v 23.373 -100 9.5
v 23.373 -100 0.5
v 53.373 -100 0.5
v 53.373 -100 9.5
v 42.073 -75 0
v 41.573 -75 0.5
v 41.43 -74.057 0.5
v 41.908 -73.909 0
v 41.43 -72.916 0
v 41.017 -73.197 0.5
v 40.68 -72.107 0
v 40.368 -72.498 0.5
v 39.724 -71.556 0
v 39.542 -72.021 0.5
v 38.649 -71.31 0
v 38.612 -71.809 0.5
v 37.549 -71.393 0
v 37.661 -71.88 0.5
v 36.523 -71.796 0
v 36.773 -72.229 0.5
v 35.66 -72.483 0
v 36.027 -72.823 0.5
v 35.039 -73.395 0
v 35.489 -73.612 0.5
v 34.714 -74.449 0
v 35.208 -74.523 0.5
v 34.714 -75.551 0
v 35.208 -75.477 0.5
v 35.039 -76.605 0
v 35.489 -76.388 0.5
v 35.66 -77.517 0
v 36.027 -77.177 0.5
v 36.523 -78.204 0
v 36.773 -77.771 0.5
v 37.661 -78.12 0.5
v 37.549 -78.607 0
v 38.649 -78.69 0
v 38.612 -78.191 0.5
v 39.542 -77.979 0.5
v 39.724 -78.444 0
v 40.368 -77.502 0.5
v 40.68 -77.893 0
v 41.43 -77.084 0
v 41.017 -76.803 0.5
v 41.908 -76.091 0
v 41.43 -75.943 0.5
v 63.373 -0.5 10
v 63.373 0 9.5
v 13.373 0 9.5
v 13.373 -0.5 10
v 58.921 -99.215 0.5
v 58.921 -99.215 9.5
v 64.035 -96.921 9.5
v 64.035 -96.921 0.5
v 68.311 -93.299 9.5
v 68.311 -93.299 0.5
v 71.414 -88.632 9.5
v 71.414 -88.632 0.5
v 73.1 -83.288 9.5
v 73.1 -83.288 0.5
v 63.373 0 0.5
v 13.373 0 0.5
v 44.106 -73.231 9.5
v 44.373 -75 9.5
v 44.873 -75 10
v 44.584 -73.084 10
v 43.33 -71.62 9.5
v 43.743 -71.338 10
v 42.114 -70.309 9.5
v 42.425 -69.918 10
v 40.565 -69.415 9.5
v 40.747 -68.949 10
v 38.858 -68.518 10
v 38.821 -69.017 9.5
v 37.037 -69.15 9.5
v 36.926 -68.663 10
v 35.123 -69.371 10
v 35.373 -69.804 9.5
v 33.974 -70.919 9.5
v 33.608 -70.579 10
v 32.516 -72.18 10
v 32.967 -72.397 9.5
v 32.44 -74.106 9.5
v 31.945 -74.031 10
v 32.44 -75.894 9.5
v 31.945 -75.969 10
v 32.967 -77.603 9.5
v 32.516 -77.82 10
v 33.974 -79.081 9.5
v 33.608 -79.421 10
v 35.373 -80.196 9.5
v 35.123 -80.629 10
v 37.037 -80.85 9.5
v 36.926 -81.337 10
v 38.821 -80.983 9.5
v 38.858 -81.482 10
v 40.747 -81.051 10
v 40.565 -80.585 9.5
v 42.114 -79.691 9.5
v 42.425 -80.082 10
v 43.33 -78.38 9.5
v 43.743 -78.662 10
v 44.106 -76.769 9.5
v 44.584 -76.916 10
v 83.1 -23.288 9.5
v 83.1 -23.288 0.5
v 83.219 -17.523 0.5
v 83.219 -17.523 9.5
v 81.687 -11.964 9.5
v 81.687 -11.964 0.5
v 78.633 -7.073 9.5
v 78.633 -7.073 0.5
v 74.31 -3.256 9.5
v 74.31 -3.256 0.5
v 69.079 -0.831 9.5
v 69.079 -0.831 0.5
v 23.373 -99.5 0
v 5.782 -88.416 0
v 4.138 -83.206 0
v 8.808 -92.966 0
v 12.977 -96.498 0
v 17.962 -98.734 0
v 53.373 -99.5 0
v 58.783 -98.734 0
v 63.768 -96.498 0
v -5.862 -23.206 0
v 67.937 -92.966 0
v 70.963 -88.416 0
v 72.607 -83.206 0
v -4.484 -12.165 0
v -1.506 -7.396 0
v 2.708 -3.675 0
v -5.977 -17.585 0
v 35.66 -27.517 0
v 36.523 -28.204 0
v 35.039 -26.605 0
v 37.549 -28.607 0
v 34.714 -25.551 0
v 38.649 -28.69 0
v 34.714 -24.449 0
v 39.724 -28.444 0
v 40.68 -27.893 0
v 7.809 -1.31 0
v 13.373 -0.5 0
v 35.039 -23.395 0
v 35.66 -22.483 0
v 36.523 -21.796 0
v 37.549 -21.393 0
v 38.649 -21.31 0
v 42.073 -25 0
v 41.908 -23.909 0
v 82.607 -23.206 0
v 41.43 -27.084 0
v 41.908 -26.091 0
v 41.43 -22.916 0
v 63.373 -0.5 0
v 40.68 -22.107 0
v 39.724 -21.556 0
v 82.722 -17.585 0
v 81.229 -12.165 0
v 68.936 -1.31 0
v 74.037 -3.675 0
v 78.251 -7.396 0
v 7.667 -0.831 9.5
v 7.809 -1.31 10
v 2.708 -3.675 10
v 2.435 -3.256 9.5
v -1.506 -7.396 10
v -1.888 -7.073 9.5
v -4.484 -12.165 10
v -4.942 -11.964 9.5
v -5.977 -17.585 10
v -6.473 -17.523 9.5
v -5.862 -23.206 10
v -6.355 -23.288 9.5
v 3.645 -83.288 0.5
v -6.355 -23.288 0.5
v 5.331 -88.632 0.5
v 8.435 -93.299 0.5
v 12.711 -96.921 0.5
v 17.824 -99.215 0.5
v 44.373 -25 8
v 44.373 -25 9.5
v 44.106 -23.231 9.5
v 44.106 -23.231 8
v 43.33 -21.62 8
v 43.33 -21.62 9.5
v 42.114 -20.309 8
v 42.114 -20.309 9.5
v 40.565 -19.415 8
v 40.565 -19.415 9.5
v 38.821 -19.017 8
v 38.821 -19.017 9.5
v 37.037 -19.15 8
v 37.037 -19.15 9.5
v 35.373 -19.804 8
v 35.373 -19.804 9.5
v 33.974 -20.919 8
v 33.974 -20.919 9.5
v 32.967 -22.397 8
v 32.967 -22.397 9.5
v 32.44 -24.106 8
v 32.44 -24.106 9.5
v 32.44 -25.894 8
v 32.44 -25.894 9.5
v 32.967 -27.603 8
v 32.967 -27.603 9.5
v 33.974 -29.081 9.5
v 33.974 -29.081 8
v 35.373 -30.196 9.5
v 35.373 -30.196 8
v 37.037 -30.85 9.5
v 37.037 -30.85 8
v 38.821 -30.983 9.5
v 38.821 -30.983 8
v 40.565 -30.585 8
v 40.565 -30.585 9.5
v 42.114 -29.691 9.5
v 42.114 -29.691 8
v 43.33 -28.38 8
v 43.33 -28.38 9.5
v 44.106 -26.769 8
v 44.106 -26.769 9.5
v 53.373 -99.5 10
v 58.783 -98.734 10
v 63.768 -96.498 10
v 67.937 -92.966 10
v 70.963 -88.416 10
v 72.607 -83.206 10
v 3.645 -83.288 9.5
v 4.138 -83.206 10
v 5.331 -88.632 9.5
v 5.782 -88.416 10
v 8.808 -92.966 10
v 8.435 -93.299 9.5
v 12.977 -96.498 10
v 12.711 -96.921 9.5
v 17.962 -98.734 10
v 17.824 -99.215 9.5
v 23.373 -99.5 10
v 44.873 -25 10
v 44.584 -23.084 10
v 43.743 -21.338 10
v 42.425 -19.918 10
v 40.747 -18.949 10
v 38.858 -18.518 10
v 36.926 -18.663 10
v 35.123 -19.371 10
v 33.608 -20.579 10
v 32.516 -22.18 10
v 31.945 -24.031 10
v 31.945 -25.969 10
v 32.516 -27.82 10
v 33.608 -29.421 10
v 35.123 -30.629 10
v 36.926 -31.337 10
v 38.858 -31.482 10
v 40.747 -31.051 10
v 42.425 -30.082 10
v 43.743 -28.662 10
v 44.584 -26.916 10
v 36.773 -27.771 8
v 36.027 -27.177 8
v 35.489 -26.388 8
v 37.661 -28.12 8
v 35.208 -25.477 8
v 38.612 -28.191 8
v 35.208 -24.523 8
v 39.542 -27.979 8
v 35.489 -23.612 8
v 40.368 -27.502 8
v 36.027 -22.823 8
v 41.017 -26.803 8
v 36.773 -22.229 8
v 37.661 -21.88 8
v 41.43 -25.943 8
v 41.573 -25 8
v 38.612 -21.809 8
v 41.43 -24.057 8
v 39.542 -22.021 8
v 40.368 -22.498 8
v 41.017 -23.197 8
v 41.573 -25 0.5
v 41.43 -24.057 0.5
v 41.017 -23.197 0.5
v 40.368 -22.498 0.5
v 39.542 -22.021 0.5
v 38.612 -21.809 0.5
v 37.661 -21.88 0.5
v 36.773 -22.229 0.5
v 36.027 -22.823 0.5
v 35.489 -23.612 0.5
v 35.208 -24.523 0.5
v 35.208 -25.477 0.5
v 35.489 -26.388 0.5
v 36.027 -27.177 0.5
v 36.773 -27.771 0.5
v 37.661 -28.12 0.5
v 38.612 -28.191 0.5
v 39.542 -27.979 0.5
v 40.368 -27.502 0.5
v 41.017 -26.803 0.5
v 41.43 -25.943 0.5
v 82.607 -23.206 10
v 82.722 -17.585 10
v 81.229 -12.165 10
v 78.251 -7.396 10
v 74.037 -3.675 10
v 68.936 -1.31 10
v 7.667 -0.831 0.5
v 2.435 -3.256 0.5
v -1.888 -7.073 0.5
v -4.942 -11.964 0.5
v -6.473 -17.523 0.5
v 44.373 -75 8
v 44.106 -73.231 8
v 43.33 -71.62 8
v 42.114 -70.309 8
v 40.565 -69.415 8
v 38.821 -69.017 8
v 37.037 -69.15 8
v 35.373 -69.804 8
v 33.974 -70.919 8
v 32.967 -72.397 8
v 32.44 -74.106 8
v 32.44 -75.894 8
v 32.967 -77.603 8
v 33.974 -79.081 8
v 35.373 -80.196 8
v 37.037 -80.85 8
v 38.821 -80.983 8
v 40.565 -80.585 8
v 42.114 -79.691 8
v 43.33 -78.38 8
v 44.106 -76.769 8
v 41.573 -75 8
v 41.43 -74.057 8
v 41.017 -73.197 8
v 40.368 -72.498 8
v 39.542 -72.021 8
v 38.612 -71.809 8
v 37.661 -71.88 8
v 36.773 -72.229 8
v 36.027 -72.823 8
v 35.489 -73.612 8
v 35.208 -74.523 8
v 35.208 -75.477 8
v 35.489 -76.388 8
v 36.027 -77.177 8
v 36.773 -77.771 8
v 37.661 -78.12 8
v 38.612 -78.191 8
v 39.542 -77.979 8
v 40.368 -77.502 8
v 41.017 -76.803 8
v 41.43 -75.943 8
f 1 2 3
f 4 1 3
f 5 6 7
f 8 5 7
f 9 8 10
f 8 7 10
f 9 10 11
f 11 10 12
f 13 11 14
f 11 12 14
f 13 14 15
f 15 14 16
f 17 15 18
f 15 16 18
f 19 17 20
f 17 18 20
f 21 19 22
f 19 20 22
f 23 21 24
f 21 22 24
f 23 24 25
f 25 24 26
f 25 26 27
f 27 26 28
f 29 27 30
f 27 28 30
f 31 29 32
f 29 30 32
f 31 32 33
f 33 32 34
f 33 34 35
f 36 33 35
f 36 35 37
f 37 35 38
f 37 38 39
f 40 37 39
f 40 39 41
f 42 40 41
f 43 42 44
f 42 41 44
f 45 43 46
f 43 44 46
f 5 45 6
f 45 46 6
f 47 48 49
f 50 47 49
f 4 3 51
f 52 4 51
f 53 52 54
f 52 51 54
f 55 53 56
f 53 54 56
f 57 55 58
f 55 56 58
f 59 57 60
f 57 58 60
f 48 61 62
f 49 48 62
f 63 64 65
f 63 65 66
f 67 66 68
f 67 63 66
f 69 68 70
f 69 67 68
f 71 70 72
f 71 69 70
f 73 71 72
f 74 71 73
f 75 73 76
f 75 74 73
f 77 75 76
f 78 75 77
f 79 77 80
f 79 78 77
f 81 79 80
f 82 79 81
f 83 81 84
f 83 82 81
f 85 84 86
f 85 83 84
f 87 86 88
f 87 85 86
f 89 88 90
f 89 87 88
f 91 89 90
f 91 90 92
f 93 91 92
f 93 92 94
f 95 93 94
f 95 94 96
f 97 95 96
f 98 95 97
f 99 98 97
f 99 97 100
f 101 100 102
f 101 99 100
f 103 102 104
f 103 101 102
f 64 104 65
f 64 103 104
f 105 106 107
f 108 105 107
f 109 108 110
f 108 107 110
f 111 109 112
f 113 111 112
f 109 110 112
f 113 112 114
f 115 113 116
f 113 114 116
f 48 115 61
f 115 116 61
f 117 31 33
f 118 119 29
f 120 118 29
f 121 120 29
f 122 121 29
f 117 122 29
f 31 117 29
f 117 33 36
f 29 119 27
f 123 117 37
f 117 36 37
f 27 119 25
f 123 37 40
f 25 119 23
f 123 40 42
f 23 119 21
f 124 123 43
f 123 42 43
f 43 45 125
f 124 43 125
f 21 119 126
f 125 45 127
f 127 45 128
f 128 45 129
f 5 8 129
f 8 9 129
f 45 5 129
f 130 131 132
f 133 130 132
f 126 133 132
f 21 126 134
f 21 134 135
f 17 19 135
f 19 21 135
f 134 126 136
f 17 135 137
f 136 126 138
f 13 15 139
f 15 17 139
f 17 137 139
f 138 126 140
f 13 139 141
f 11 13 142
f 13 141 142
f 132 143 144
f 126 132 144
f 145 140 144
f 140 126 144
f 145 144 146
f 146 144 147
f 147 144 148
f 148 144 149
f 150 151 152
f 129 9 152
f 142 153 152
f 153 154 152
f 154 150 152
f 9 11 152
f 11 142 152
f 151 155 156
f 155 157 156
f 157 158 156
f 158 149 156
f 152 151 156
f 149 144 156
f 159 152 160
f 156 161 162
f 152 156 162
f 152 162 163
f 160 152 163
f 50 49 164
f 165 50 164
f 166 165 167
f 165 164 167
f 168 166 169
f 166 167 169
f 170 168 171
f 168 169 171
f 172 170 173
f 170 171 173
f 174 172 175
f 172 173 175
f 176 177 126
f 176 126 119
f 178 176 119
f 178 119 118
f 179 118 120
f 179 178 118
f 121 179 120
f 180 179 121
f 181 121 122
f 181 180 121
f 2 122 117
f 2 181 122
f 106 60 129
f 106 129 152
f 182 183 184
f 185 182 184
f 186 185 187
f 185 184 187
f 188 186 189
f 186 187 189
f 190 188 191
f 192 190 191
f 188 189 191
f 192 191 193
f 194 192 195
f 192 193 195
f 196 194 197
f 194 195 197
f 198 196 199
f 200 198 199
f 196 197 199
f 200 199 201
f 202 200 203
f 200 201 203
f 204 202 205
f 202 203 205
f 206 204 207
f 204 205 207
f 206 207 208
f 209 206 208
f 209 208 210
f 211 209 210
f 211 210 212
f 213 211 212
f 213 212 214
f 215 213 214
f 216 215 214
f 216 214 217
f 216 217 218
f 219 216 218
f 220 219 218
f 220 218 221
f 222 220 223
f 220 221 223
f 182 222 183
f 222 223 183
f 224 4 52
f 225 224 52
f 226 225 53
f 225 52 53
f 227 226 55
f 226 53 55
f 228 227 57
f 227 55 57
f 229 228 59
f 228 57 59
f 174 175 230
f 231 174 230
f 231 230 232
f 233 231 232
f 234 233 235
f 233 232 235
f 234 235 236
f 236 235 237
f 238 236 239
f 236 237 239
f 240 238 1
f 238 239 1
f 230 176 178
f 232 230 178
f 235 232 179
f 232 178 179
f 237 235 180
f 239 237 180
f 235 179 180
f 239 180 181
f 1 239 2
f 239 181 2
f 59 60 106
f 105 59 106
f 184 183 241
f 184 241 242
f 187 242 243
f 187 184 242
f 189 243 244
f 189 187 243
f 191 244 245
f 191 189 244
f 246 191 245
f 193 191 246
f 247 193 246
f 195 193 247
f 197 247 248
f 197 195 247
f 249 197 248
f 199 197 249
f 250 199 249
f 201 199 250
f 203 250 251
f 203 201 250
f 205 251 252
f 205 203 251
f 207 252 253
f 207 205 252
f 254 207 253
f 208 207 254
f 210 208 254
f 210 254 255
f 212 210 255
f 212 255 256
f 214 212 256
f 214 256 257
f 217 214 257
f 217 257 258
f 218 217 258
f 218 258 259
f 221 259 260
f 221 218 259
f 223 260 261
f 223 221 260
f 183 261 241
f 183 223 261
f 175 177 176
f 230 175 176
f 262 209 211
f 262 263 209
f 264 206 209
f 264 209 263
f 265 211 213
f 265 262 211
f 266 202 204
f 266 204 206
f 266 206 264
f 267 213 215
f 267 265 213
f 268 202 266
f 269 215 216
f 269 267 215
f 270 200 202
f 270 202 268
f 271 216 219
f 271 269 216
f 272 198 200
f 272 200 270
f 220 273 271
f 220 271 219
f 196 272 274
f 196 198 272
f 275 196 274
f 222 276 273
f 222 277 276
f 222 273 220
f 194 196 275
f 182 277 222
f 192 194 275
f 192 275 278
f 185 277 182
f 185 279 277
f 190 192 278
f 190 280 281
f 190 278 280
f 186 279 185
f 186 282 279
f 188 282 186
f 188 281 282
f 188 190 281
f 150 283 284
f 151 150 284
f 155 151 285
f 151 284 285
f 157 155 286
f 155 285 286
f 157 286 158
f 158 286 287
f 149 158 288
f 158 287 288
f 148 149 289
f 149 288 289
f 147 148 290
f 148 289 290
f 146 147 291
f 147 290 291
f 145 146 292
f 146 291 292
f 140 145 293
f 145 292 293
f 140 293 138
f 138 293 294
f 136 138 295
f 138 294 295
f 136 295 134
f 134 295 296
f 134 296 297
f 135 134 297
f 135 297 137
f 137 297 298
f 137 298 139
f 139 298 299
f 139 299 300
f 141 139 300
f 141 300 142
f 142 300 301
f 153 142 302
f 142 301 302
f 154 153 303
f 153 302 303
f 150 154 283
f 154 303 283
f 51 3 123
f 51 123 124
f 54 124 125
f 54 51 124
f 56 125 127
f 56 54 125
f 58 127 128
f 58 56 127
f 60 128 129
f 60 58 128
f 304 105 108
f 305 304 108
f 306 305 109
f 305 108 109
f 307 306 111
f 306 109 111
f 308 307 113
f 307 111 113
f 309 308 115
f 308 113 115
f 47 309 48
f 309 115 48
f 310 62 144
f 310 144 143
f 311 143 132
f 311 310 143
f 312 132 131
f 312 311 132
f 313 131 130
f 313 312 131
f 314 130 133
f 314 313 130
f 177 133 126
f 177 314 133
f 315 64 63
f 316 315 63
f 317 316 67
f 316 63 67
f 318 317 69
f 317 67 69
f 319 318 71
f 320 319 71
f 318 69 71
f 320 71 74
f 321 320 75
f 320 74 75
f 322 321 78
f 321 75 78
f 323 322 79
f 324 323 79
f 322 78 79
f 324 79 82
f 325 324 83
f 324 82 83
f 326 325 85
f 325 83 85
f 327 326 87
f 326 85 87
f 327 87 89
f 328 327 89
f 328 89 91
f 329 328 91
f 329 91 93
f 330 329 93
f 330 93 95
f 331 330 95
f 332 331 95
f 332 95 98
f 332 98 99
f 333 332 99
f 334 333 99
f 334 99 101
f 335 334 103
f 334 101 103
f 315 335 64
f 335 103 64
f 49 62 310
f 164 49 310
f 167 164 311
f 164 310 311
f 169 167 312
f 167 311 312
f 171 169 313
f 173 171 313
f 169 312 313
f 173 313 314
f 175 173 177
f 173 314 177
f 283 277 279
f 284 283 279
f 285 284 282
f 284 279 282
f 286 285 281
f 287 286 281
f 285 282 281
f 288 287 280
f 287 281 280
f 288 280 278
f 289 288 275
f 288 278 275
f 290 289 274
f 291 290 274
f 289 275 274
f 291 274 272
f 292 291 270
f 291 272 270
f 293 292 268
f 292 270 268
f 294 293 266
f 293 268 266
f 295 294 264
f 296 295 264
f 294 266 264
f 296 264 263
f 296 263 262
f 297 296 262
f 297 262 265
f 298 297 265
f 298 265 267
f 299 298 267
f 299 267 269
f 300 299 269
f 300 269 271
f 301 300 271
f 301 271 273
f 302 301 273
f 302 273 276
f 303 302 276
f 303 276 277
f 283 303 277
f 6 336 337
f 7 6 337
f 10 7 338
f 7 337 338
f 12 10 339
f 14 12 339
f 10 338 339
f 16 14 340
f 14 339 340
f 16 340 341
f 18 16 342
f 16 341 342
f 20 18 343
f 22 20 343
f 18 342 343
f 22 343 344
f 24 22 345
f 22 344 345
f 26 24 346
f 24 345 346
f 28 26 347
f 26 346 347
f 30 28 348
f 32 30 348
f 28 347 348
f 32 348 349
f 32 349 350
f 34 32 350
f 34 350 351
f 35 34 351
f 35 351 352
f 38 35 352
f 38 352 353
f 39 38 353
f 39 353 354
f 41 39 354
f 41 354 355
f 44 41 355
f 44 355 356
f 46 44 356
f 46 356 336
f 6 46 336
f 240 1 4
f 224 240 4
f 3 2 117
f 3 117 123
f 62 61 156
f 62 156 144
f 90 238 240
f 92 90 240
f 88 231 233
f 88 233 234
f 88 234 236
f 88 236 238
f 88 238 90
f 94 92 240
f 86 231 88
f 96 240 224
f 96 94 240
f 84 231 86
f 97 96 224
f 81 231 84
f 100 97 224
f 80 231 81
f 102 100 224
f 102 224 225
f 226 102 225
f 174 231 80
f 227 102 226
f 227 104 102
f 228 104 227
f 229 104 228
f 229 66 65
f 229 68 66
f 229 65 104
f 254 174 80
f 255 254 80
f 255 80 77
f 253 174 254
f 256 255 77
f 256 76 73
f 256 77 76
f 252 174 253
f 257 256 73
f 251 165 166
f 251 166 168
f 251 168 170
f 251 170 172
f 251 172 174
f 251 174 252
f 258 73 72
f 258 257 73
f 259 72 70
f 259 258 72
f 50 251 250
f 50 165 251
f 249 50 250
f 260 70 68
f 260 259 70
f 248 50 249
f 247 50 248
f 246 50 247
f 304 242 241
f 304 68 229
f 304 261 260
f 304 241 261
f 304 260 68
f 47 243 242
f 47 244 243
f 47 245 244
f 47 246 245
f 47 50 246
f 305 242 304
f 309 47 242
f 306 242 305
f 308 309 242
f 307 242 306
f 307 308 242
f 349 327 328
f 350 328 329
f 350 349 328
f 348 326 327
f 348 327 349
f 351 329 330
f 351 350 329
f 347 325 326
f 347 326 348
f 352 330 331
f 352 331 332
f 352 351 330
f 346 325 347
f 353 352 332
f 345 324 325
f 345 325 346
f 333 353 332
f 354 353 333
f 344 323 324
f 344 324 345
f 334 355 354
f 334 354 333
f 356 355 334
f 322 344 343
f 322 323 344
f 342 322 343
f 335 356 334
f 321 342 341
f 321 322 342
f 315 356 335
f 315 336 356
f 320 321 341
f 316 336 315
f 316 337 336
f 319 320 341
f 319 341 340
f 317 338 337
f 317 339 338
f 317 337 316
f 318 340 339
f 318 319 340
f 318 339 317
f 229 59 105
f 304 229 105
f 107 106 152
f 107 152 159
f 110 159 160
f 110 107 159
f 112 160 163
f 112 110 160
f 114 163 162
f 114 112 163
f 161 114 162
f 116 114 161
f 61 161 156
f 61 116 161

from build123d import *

# Parameters (mm, degrees)
BOSS_EXTRUDE1_DEPTH = 10
SKETCH4_R           = 6
CUT_EXTRUDE1_DEPTH  = 2
SKETCH5_R           = 3.2
CUT_EXTRUDE2_DEPTH  = 131.441517879
CHAMFER1_SIZE       = 0.5


with BuildPart() as part:
    # Sketch3 → Boss-Extrude1 (new body)
    with BuildSketch(Plane.XY):
        with BuildLine():
            Line((-6.355283539, -23.287979746), (3.644716461, -83.287979746))
            ThreePointArc((3.644716461, -83.287979746), (10.445097015, -95.260399649), (23.372594937, -100))
            Line((23.372594937, -100), (53.372594937, -100))
            ThreePointArc((53.372594937, -100), (66.30009286, -95.260399649), (73.100473414, -83.287979746))
            Line((73.100473414, -83.287979746), (83.100473414, -23.287979746))
            ThreePointArc((83.100473414, -23.287979746), (78.632994587, -7.072502077), (63.372594937, 0))
            Line((63.372594937, 0), (13.372594937, 0))
            ThreePointArc((13.372594937, 0), (-1.887804712, -7.072502077), (-6.355283539, -23.287979746))
        make_face()
    extrude(amount=BOSS_EXTRUDE1_DEPTH)

    # Sketch4 → Cut-Extrude1 (cut)
    with BuildSketch(Plane.XY.offset(10)):
        with Locations((38.372594937, -25)):
            Circle(SKETCH4_R)
        with Locations((38.372594937, -75)):
            Circle(SKETCH4_R)
    extrude(amount=-CUT_EXTRUDE1_DEPTH, mode=Mode.SUBTRACT)

    # Sketch5 → Cut-Extrude2 (cut, through all)
    with BuildSketch(Plane.XY.offset(8)):
        with Locations((38.372594937, -25)):
            Circle(SKETCH5_R)
        with Locations((38.372594937, -75)):
            Circle(SKETCH5_R)
    extrude(amount=-CUT_EXTRUDE2_DEPTH, mode=Mode.SUBTRACT)

    # Chamfer1
    chamfer1_edges = [part.edges().sort_by_distance(p)[0] for p in [
        (66.30009286, -95.260399649, 0),
        (38.372594937, -100, 0),
        (10.445097015, -95.260399649, 0),
        (-1.355283539, -53.287979746, 0),
        (38.372594937, -100, 10),
        (66.30009286, -95.260399649, 10),
        (78.100473414, -53.287979746, 10),
        (78.632994587, -7.072502077, 10),
        (32.372594937, -25, 10),
        (32.372594937, -75, 10),
        (38.372594937, 0, 10),
        (-1.887804712, -7.072502077, 10),
        (35.172594937, -25, 0),
        (35.172594937, -75, 0),
        (-1.355283539, -53.287979746, 10),
        (-1.887804712, -7.072502077, 0),
        (10.445097015, -95.260399649, 10),
        (38.372594937, 0, 0),
        (78.632994587, -7.072502077, 0),
        (78.100473414, -53.287979746, 0),
    ]]
    chamfer(chamfer1_edges, length=CHAMFER1_SIZE)


solid = part.part
